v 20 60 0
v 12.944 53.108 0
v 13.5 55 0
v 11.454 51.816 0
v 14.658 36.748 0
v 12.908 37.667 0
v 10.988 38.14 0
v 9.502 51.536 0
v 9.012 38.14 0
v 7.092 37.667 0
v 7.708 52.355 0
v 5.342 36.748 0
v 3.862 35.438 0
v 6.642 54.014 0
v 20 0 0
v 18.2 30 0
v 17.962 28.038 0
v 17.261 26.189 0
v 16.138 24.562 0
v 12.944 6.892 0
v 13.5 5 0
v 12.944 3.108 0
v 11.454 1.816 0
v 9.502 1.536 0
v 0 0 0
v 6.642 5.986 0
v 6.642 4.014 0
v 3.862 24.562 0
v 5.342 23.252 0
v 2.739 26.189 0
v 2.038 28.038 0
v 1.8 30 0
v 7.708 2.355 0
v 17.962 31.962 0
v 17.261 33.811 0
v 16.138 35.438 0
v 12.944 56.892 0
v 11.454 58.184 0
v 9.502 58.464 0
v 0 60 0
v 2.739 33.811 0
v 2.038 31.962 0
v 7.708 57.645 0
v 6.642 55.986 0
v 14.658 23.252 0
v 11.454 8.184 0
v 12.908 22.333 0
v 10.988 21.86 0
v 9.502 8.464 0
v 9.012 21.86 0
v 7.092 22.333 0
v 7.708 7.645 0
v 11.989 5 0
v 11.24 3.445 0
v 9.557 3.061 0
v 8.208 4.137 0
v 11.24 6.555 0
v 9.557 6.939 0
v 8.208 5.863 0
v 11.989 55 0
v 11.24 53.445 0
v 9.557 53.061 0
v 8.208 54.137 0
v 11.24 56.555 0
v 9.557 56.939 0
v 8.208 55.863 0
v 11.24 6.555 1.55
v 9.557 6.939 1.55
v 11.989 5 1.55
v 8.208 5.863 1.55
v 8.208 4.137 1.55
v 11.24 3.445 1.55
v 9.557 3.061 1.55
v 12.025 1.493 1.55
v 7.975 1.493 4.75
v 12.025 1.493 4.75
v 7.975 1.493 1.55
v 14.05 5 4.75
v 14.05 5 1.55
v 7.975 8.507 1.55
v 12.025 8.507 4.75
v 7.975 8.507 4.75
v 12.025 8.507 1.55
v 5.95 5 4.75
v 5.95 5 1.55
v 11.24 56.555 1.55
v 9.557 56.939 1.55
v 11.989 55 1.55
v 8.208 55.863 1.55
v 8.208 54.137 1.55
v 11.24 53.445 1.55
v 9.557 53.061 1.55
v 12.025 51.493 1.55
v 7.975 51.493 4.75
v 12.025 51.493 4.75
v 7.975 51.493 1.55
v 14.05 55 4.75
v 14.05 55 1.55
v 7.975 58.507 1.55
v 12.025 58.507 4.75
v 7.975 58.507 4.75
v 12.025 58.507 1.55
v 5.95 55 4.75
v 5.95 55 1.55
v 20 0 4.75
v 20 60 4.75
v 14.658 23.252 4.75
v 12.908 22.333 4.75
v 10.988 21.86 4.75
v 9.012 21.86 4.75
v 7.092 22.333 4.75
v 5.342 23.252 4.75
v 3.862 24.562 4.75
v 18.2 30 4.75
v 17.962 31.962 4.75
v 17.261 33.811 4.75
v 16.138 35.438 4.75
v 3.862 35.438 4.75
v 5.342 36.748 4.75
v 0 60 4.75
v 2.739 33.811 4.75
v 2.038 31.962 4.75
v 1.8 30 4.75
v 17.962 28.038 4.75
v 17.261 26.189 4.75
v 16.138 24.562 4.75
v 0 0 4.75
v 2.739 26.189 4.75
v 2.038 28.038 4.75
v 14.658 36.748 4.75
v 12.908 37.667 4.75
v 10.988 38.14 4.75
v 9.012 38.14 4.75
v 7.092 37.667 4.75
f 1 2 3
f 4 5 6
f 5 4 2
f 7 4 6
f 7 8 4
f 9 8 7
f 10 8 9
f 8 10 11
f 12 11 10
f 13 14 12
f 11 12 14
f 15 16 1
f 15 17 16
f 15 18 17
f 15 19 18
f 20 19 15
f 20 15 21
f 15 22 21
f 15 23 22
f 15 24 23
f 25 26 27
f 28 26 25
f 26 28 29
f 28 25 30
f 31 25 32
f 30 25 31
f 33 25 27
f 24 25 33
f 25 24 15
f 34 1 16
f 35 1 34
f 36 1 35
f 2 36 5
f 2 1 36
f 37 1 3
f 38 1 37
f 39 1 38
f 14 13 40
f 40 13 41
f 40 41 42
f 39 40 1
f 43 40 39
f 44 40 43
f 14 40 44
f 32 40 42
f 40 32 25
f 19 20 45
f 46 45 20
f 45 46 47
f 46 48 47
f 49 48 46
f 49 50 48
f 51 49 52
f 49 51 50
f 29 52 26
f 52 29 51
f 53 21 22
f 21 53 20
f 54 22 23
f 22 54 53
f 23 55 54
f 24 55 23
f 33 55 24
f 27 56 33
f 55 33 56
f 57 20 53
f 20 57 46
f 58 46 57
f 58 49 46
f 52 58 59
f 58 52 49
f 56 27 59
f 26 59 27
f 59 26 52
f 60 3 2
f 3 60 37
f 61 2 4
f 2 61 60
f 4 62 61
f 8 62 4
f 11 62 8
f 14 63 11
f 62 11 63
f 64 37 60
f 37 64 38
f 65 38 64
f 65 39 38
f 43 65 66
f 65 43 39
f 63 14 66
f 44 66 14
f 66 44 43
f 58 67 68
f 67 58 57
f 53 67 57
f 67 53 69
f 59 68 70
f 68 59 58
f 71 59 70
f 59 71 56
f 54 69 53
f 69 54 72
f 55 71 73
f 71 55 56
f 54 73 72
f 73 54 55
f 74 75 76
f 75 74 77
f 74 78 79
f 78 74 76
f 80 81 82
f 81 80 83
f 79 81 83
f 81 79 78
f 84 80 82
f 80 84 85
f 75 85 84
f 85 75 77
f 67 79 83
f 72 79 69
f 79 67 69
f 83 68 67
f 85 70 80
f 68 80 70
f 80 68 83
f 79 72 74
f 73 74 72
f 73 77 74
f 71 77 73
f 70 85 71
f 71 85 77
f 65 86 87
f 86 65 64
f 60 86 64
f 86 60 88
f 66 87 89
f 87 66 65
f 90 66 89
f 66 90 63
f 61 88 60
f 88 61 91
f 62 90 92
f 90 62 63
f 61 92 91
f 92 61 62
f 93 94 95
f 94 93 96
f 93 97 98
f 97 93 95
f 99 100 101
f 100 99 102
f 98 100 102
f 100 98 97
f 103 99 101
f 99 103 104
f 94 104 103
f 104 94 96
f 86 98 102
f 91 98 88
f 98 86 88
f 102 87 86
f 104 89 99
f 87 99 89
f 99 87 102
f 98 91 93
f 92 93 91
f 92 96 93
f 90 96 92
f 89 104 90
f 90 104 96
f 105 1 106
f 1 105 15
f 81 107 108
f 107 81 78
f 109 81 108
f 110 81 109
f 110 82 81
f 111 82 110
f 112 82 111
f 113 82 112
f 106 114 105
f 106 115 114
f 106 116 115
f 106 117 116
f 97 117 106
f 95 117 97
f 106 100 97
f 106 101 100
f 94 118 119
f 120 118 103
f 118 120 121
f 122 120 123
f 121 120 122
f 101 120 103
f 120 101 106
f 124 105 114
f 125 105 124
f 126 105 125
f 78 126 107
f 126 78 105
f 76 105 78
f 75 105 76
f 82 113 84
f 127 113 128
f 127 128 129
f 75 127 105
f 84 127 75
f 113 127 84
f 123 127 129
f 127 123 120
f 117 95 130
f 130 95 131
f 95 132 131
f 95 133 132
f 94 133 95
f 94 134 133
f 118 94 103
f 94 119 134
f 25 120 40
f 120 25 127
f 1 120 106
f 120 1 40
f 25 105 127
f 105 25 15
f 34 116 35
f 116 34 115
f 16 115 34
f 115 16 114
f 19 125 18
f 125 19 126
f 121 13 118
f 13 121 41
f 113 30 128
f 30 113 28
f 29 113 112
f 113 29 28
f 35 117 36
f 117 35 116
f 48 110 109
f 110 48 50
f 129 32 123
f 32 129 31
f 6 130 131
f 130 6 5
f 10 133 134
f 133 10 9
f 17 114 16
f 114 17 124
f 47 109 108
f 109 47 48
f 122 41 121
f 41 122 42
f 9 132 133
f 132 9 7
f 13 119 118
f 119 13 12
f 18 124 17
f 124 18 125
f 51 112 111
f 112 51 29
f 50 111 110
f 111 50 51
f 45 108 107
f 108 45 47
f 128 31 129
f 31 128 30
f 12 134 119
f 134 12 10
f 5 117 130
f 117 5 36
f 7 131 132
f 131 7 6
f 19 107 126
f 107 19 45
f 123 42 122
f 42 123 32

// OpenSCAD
//Configuration

filament_tol = 1; //extra diameter in filament path

include <MCAD/nuts_and_bolts.scad>

mount();

module mount(groovemount=true) {
	//mounting dimensions
	hole_dist = 50;
	base_thick=4.75;
	base_w = 20;
	base_l = 60;

	//hotend dimensions – standard groovemount (http://reprap.org/wiki/Groove_Mount)
	hotend_d = 16.2;
	hotend_above_mount = 4.75; //thickness of the part of the hotend that sticks above the mounting plate
	hotend_groove_d = 12;
	hotend_groove_thick = 4.75;

	hotend_tol = 0.1;
	
	difference() {
		//base rectangle
		cube([base_w, base_l, base_thick]);

		//bolt holes
		translate([base_w / 2, base_l / 2, 0]) {
			translate([0, -hole_dist / 2, 0]) {
				boltHole(size = 4, length = base_thick);
				translate([0,0,base_thick - METRIC_NUT_THICKNESS[4]]) nutHole(size = 4);
			}
			translate([0, hole_dist / 2, 0]) {
				boltHole(size = 4, length = base_thick);
				translate([0,0,base_thick - METRIC_NUT_THICKNESS[4]]) nutHole(size = 4);
			}
		}
	
		//space for upper part of hotend if using normal groovemount
		if(groovemount == true) {
			translate([base_w / 2, base_l / 2, -0.01]) {
				cylinder(d = hotend_d + hotend_tol*2, h = hotend_above_mount + hotend_tol);
			}
		}
	}

	translate([base_w / 2, base_l / 2, base_thick]) {
		children();
	}
}
